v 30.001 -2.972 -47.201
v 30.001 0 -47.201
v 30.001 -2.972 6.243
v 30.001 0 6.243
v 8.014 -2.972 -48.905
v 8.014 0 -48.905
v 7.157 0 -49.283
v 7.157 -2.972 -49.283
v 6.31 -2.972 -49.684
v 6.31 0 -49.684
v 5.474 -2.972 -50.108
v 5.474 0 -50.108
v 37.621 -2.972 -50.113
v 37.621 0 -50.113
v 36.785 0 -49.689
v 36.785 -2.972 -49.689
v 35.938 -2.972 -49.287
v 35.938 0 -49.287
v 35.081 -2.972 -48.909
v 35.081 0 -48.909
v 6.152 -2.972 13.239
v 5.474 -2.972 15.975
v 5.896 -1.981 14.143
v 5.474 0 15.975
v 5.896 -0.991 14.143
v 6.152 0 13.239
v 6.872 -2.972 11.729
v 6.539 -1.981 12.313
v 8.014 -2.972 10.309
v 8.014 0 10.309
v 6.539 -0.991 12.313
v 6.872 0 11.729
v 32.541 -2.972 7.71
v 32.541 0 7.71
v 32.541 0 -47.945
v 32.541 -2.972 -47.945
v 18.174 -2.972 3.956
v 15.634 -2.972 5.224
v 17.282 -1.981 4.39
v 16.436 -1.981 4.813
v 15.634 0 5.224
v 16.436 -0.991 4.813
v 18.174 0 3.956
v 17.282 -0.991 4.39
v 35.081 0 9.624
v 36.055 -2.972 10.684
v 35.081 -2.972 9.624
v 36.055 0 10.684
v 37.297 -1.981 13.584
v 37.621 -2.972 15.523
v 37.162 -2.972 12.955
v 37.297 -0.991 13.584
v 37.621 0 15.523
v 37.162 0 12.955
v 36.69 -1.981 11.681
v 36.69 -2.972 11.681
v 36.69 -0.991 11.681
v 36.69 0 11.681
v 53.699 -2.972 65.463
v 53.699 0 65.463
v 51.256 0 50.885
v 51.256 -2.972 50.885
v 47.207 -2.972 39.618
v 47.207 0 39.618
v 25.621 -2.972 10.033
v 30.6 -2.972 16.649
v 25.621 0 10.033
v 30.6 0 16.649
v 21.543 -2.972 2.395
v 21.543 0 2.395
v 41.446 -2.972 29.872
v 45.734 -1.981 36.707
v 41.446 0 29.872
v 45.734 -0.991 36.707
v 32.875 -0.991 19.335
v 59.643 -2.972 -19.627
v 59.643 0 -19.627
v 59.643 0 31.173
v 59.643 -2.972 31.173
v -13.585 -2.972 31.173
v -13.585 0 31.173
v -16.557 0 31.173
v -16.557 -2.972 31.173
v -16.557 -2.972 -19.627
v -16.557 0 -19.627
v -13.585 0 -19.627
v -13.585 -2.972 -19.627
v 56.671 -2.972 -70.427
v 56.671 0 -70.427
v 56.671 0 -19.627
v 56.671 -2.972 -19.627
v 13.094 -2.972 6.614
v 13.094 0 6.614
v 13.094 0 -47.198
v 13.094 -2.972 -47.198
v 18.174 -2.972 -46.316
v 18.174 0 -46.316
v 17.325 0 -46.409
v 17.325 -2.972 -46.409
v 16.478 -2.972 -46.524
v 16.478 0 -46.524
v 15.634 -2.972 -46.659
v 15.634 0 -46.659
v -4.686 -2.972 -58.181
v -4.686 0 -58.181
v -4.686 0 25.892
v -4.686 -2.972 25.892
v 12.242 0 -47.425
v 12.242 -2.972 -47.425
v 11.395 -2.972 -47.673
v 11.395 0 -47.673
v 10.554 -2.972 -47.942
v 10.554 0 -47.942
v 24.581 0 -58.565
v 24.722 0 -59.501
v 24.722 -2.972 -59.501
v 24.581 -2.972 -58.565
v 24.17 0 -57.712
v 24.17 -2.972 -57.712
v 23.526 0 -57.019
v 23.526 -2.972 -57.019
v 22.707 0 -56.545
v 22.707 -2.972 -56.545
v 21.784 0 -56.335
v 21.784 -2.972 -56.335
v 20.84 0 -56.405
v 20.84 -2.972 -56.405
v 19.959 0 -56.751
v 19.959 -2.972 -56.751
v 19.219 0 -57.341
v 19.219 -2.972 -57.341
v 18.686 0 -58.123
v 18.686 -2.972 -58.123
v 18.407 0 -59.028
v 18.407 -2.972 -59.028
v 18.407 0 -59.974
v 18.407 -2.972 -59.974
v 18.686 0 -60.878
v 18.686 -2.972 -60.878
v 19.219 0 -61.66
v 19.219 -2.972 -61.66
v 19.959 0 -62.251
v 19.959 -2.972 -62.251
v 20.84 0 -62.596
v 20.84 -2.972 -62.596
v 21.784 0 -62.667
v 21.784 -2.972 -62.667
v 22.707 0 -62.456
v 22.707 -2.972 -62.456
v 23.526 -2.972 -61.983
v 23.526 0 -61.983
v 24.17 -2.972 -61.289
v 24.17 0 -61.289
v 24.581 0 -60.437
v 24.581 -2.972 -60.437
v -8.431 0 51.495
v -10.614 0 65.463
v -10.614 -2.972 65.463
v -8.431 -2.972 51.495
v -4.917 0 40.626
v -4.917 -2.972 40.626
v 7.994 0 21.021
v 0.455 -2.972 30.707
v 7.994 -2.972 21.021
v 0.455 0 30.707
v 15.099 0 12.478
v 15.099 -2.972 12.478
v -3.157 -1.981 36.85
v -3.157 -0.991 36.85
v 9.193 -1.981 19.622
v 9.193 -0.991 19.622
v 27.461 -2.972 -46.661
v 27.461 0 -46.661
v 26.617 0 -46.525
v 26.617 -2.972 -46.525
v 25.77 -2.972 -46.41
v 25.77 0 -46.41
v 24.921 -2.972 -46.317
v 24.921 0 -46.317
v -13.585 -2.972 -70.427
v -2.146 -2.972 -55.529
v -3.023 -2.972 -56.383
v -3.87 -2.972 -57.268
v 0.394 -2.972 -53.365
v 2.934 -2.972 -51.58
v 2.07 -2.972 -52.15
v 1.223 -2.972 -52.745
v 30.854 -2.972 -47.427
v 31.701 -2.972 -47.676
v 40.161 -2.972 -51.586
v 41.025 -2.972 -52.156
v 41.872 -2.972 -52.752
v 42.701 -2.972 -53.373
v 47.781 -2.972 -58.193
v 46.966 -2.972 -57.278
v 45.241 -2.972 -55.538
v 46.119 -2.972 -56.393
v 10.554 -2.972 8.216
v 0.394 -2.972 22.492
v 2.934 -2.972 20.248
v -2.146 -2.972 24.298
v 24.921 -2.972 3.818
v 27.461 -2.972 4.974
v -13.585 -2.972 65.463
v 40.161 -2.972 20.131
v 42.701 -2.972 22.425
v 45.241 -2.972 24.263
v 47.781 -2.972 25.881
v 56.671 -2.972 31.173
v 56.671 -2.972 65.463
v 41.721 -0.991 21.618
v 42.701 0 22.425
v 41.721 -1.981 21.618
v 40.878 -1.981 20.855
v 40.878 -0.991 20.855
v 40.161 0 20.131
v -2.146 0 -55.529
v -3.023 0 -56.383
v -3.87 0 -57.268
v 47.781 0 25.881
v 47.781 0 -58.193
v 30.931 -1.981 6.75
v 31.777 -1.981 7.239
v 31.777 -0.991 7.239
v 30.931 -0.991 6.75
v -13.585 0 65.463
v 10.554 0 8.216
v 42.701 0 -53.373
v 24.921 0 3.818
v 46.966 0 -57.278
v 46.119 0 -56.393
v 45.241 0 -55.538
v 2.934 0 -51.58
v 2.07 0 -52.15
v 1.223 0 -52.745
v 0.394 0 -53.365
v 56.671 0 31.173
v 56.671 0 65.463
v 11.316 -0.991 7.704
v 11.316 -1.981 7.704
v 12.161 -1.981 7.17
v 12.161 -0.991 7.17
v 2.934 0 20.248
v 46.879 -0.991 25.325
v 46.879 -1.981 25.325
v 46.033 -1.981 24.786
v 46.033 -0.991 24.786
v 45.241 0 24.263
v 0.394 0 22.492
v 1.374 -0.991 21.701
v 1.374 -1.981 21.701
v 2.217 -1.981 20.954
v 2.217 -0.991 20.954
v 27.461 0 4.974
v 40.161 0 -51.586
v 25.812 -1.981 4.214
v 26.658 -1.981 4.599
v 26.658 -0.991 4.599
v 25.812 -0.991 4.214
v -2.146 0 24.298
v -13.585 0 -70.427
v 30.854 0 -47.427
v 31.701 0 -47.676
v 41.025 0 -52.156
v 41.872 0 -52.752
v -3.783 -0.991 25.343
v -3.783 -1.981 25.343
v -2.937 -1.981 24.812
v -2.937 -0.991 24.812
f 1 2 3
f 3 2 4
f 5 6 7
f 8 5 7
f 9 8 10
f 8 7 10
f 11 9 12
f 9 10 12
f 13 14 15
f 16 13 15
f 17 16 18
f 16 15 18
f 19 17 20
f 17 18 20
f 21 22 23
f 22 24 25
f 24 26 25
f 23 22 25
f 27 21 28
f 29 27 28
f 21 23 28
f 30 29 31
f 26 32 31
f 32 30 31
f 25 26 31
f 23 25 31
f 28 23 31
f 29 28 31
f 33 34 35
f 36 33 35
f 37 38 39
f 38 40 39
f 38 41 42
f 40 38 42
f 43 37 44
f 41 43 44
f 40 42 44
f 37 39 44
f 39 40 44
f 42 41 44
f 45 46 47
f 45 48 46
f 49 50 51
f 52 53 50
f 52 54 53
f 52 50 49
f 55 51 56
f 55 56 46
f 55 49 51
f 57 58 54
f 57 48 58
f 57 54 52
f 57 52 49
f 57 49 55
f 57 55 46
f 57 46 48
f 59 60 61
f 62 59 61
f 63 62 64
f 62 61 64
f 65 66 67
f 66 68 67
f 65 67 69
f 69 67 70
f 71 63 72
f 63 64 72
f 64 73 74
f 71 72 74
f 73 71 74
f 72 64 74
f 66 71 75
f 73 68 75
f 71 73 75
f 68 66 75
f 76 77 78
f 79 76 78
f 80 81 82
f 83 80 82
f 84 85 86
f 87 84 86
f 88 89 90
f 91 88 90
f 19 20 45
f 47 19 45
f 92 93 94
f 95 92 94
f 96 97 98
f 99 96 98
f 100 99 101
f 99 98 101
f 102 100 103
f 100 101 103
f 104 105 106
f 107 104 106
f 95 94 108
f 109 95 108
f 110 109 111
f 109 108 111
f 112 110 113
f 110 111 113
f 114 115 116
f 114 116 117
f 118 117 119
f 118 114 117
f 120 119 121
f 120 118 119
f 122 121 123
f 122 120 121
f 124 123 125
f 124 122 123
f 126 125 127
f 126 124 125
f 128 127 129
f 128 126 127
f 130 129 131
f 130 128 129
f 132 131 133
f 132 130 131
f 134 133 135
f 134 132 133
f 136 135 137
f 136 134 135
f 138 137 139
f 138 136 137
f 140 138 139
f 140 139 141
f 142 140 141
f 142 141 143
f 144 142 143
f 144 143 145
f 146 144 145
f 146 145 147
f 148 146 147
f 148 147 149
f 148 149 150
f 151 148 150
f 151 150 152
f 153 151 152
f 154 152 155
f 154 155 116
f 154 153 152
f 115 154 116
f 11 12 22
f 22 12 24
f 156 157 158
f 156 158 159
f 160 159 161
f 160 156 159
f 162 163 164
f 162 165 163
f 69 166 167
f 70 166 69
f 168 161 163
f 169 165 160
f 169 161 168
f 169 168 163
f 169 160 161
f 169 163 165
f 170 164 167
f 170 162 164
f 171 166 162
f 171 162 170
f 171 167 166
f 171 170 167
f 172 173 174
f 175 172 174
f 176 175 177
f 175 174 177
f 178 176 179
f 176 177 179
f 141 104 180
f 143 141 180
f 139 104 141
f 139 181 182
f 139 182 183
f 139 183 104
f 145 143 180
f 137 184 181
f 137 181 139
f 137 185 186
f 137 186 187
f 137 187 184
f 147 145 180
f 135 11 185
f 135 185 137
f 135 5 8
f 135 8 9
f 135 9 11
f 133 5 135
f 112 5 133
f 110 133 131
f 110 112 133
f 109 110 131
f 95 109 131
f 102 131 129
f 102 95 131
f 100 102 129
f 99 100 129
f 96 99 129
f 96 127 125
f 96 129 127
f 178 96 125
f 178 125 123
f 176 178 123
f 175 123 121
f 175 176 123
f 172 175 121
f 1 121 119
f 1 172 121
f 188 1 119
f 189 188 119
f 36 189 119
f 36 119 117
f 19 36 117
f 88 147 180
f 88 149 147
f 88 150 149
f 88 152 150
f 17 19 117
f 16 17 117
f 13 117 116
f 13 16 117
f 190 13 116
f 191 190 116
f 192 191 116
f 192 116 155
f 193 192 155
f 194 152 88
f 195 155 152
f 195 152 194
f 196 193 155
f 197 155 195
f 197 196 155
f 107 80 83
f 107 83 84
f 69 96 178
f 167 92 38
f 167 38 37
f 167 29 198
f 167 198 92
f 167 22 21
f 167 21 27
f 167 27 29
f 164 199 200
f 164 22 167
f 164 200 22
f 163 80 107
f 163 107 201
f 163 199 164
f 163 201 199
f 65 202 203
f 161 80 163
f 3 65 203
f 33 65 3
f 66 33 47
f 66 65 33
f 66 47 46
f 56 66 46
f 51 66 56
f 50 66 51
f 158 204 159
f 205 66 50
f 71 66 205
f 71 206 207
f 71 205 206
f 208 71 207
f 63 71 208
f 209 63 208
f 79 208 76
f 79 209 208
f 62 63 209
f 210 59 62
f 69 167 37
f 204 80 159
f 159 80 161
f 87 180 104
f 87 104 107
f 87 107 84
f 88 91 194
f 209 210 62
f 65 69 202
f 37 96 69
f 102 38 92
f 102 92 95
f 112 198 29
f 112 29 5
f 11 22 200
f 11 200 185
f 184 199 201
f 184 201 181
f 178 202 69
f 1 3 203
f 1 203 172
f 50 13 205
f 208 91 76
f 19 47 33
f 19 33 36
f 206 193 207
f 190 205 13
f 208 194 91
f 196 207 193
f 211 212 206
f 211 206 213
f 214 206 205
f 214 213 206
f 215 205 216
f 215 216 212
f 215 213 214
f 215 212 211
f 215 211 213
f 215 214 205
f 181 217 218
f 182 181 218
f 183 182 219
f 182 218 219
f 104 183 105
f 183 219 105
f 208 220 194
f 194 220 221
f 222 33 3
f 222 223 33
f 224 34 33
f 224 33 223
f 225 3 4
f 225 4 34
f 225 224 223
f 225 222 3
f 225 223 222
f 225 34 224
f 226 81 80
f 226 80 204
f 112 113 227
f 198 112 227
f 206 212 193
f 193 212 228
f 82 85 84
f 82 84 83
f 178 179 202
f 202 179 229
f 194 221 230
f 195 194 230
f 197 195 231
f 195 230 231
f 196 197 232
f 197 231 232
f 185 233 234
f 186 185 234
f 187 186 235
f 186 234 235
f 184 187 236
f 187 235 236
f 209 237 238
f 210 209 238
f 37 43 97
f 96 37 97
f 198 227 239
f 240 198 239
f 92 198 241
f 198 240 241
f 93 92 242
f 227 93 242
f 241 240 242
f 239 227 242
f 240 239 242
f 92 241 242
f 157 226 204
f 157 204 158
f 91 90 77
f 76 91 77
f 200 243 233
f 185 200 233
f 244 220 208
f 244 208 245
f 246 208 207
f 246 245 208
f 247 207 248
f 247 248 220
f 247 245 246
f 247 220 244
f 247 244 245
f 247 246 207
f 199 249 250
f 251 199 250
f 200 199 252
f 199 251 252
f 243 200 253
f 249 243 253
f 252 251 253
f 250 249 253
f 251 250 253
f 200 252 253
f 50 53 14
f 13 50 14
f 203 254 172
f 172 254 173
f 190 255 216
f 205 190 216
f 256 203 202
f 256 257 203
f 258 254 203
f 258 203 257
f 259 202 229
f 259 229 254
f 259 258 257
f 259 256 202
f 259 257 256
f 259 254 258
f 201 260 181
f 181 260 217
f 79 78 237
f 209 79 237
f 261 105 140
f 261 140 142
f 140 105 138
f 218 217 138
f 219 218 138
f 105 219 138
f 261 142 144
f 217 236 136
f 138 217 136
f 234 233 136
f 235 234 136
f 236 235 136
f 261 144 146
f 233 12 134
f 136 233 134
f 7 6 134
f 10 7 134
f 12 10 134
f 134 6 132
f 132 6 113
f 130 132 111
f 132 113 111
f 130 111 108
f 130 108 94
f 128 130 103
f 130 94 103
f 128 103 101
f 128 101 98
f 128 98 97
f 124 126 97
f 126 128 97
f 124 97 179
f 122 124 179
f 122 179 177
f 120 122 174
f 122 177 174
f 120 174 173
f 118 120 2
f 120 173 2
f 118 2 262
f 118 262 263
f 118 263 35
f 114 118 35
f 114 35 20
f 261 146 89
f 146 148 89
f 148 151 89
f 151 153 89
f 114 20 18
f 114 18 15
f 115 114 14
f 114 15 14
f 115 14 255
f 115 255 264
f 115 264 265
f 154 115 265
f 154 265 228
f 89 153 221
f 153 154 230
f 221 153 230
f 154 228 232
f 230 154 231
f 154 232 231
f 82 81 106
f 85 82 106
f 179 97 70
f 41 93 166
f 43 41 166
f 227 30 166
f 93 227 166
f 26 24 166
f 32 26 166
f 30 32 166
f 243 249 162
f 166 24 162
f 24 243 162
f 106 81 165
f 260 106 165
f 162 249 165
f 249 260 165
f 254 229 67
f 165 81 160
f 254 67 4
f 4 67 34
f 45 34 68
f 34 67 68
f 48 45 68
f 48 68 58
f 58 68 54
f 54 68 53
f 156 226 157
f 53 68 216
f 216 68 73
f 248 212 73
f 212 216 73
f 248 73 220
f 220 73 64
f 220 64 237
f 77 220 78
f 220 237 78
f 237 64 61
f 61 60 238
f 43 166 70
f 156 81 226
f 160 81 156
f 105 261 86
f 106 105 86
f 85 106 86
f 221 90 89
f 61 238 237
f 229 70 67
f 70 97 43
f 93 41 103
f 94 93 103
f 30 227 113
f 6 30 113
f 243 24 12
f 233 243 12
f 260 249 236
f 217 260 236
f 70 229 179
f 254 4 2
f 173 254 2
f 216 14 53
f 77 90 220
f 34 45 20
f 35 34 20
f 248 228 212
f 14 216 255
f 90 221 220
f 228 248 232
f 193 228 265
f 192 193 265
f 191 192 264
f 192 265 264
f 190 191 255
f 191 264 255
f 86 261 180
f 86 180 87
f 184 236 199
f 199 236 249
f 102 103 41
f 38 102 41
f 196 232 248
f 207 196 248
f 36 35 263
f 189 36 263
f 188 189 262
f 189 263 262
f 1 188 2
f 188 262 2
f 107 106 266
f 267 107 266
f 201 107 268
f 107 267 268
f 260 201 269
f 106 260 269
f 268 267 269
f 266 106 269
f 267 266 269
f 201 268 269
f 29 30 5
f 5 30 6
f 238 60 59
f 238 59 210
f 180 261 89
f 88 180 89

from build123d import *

# Parameters (mm, degrees)
F0_R     = 3.175
F0_W     = 2.9718
F0_H     = 50.8
F0_H_2   = 34.29
F1_DEPTH = 2.9718


# Not quite as in the source:
# - a feature names something its author has since deleted; it is built from what else it names


with BuildPart() as f1:
    # F0 (on Front) → F1 (new body)
    with BuildSketch(Plane.XZ):
        with BuildLine():
            Line((-10.6135604082, -19.6269177035), (-10.6135604082, -70.4269177035))
            Line((-10.6135604082, -70.4269177035), (53.6992395918, -70.4269177035))
            Line((53.6992395918, -70.4269177035), (53.6992395918, -19.6269177035))
            Line((53.6992395918, -19.6269177035), (53.6992395918, 31.1730822965))
            Line((53.6992395918, 31.1730822965), (53.6992395918, 65.4630822965))
            add(Edge.make_bspline(
                [(53.6992395918, 65.4630822965), (50.3210395918, 27.3630822965), (29.9713909626, 22.7711647749), (21.5428395918, 2.3945980662)],
                knots=[0, 0, 0, 0, 70.7931335941, 70.7931335941, 70.7931335941, 70.7931335941], degree=3))
            add(Edge.make_bspline(
                [(-10.6135604082, 65.4630822965), (-7.2353604082, 27.3630822965), (10.8240395918, 23.417426143), (21.5428395918, 2.3945980662)],
                knots=[0, 0, 0, 0, 70.7931335941, 70.7931335941, 70.7931335941, 70.7931335941], degree=3))
            Line((-10.6135604082, 65.4630822965), (-10.6135604082, 31.1730822965))
            Line((-10.6135604082, 31.1730822965), (-10.6135604082, -19.6269177035))
        make_face()
        with Locations((21.5466730297, -59.5008693635)):
            Circle(F0_R, mode=Mode.SUBTRACT)
        with BuildLine():
            add(Edge.make_bspline(
                [(18.174427537, 3.9557799586), (19.2048586468, 3.4597391149), (20.3249139395, 2.9401290525), (21.5428395918, 2.3945980662)],
                knots=[36.4374086053, 36.4374086053, 36.4374086053, 36.4374086053, 38.1, 38.1, 38.1, 38.1], degree=3))
            add(Edge.make_bspline(
                [(24.9210395918, 3.8182866349), (23.8862684635, 3.3648017903), (22.7628335347, 2.8909334778), (21.5428395918, 2.3945980662)],
                knots=[36.4848270835, 36.4848270835, 36.4848270835, 36.4848270835, 38.1, 38.1, 38.1, 38.1], degree=3))
            add(Edge.make_bspline(
                [(27.4610395918, 4.9737252721), (26.6799254221, 4.6035259347), (25.8350725803, 4.2188584101), (24.9210395918, 3.8182866349)],
                knots=[35.0581141735, 35.0581141735, 35.0581141735, 35.0581141735, 36.4848270835, 36.4848270835, 36.4848270835, 36.4848270835], degree=3))
            add(Edge.make_bspline(
                [(30.0010395918, 6.2432045407), (29.2394523696, 5.8391275699), (28.3958951656, 5.4167884341), (27.4610395918, 4.9737252721)],
                knots=[33.3505910381, 33.3505910381, 33.3505910381, 33.3505910381, 35.0581141735, 35.0581141735, 35.0581141735, 35.0581141735], degree=3))
            add(Edge.make_bspline(
                [(32.5410395918, 7.709522157), (31.815508389, 7.2472020661), (30.9753523304, 6.7601477463), (30.0010395918, 6.2432045407)],
                knots=[31.1661248423, 31.1661248423, 31.1661248423, 31.1661248423, 33.3505910381, 33.3505910381, 33.3505910381, 33.3505910381], degree=3))
            add(Edge.make_bspline(
                [(35.0810395918, 9.6243844167), (34.4449246224, 9.0294716961), (33.6196497273, 8.3968297933), (32.5410395918, 7.709522157)],
                knots=[27.9185906625, 27.9185906625, 27.9185906625, 27.9185906625, 31.1661248423, 31.1661248423, 31.1661248423, 31.1661248423], degree=3))
            add(Edge.make_bspline(
                [(37.6210395918, 15.5231181366), (37.1997000639, 13.5029330493), (37.4295721889, 11.8207985618), (35.0810395918, 9.6243844167)],
                knots=[15.9287142288, 15.9287142288, 15.9287142288, 15.9287142288, 27.9185906625, 27.9185906625, 27.9185906625, 27.9185906625], degree=3))
            add(Edge.make_bspline(
                [(40.1610395918, 20.1314996321), (38.4452100282, 18.2956109855), (37.8952324766, 16.8377832468), (37.6210395918, 15.5231181366)],
                knots=[8.1261260785, 8.1261260785, 8.1261260785, 8.1261260785, 15.9287142288, 15.9287142288, 15.9287142288, 15.9287142288], degree=3))
            add(Edge.make_bspline(
                [(42.7010395918, 22.4248035121), (41.6492517803, 21.5958754464), (40.8193404202, 20.8358627241), (40.1610395918, 20.1314996321)],
                knots=[5.1325593794, 5.1325593794, 5.1325593794, 5.1325593794, 8.1261260785, 8.1261260785, 8.1261260785, 8.1261260785], degree=3))
            add(Edge.make_bspline(
                [(45.2410395918, 24.2632398541), (44.2752085711, 23.6139450004), (43.4342172947, 23.0026306826), (42.7010395918, 22.4248035121)],
                knots=[3.0458111478, 3.0458111478, 3.0458111478, 3.0458111478, 5.1325593794, 5.1325593794, 5.1325593794, 5.1325593794], degree=3))
            add(Edge.make_bspline(
                [(47.7810395918, 25.8807627574), (46.8503141861, 25.3162427283), (46.0064724881, 24.7778139666), (45.2410395918, 24.2632398541)],
                knots=[1.3920376526, 1.3920376526, 1.3920376526, 1.3920376526, 3.0458111478, 3.0458111478, 3.0458111478, 3.0458111478], degree=3))
            add(Edge.make_bspline(
                [(50.3210395918, 27.3630822965), (49.4094448692, 26.8496004392), (48.5644629644, 26.3559385528), (47.7810395918, 25.8807627574)],
                knots=[0, 0, 0, 0, 1.3920376526, 1.3920376526, 1.3920376526, 1.3920376526], degree=3))
            Line((50.3210395918, 27.3630822965), (50.3210395918, -61.5369177035))
            ThreePointArc((50.3210395918, -61.5369177035), (49.1018112077, -59.8262756393), (47.7810395918, -58.1927590453))
            ThreePointArc((47.7810395918, -58.1927590453), (46.5462872107, -56.8318592668), (45.2410395918, -55.5384180031))
            ThreePointArc((45.2410395918, -55.5384180031), (43.9971682474, -54.4248535099), (42.7010395918, -53.3725739321))
            ThreePointArc((42.7010395918, -53.3725739321), (41.4510857441, -52.4508932423), (40.1610395918, -51.5862194078))
            ThreePointArc((40.1610395918, -51.5862194078), (38.9066725875, -50.8226179021), (37.6210395918, -50.112919627))
            ThreePointArc((37.6210395918, -50.112919627), (36.36326544, -49.4852618571), (35.0810395918, -48.9092002568))
            ThreePointArc((35.0810395918, -48.9092002568), (33.8205009635, -48.4023559957), (32.5410395918, -47.9453796977))
            ThreePointArc((32.5410395918, -47.9453796977), (31.2781609586, -47.5487876175), (30.0010395918, -47.2007808145))
            ThreePointArc((30.0010395918, -47.2007808145), (28.7361037745, -46.907078004), (27.4610395918, -46.6610387941))
            ThreePointArc((27.4610395918, -46.6610387941), (26.1942303865, -46.4652554761), (24.9210395918, -46.316521248))
            ThreePointArc((24.9210395918, -46.316521248), (21.547756981, -46.1512435423), (18.174427537, -46.3155626059))
            ThreePointArc((18.174427537, -46.3155626059), (16.901243708, -46.46392835), (15.634427537, -46.659341362))
            ThreePointArc((15.634427537, -46.659341362), (14.3593708721, -46.90499798), (13.094427537, -47.1983152681))
            ThreePointArc((13.094427537, -47.1983152681), (11.8173145662, -47.5459173972), (10.554427537, -47.9421006017))
            ThreePointArc((10.554427537, -47.9421006017), (9.2749758876, -48.3986398999), (8.014427537, -48.9050414301))
            ThreePointArc((8.014427537, -48.9050414301), (6.7322134008, -49.480619628), (5.474427537, -50.1077863311))
            ThreePointArc((5.474427537, -50.1077863311), (4.1888093009, -50.8169340928), (2.934427537, -51.5799748434))
            ThreePointArc((2.934427537, -51.5799748434), (1.6444010223, -52.4439982142), (0.394427537, -53.365014544))
            ThreePointArc((0.394427537, -53.365014544), (-0.9016730983, -54.4164866486), (-2.145572463, -55.5292241802))
            ThreePointArc((-2.145572463, -55.5292241802), (-3.4507759715, -56.8215888342), (-4.685572463, -58.1813830179))
            ThreePointArc((-4.685572463, -58.1813830179), (-6.0115928229, -59.8203006816), (-7.2353604082, -61.5369177035))
            add(Edge.make_bspline(
                [(-7.2353604082, 27.3630822965), (-7.2353604082, -0.334873893), (-7.2353604082, -33.838961514), (-7.2353604082, -61.5369177035)],
                knots=[0, 0, 0, 0, 88.9, 88.9, 88.9, 88.9], degree=3))
            add(Edge.make_bspline(
                [(-7.2353604082, 27.3630822965), (-6.3195404997, 26.8524970598), (-5.4713701457, 26.3626827218), (-4.685572463, 25.8921343821)],
                knots=[0, 0, 0, 0, 1.4327172124, 1.4327172124, 1.4327172124, 1.4327172124], degree=3))
            add(Edge.make_bspline(
                [(-4.685572463, 25.8921343821), (-3.7542137819, 25.3344217663), (-2.9104758153, 24.8037738972), (-2.145572463, 24.29768509)],
                knots=[1.4327172124, 1.4327172124, 1.4327172124, 1.4327172124, 3.1308306617, 3.1308306617, 3.1308306617, 3.1308306617], degree=3))
            add(Edge.make_bspline(
                [(-2.145572463, 24.29768509), (-1.1789086721, 23.6581039933), (-0.3381532858, 23.057746686), (0.394427537, 22.491555701)],
                knots=[3.1308306617, 3.1308306617, 3.1308306617, 3.1308306617, 5.2768596724, 5.2768596724, 5.2768596724, 5.2768596724], degree=3))
            add(Edge.make_bspline(
                [(0.394427537, 22.491555701), (1.4468013348, 21.6782057761), (2.2759443341, 20.9353620327), (2.934427537, 20.2480318861)],
                knots=[5.2768596724, 5.2768596724, 5.2768596724, 5.2768596724, 8.3596931702, 8.3596931702, 8.3596931702, 8.3596931702], degree=3))
            add(Edge.make_bspline(
                [(2.934427537, 20.2480318861), (4.5480124747, 18.5637587463), (5.1368295827, 17.2128303622), (5.474427537, 15.9746404386)],
                knots=[8.3596931702, 8.3596931702, 8.3596931702, 8.3596931702, 15.9140448616, 15.9140448616, 15.9140448616, 15.9140448616], degree=3))
            add(Edge.make_bspline(
                [(5.474427537, 15.9746404386), (5.9896552573, 14.084967342), (5.9197540389, 12.4578798594), (8.014427537, 10.3091972977)],
                knots=[15.9140448616, 15.9140448616, 15.9140448616, 15.9140448616, 27.4431769284, 27.4431769284, 27.4431769284, 27.4431769284], degree=3))
            add(Edge.make_bspline(
                [(8.014427537, 10.3091972977), (8.6420846531, 9.6653566698), (9.4640918921, 8.9746837165), (10.554427537, 8.2160807673)],
                knots=[27.4431769284, 27.4431769284, 27.4431769284, 27.4431769284, 30.8978164182, 30.8978164182, 30.8978164182, 30.8978164182], degree=3))
            add(Edge.make_bspline(
                [(10.554427537, 8.2160807673), (11.2763160606, 7.713825553), (12.1158260279, 7.1817933043), (13.094427537, 6.6138610208)],
                knots=[30.8978164182, 30.8978164182, 30.8978164182, 30.8978164182, 33.1850612795, 33.1850612795, 33.1850612795, 33.1850612795], degree=3))
            add(Edge.make_bspline(
                [(13.094427537, 6.6138610208), (13.8539601424, 6.1730655764), (14.6972807439, 5.7106441444), (15.634427537, 5.2237339583)],
                knots=[33.1850612795, 33.1850612795, 33.1850612795, 33.1850612795, 34.9602854465, 34.9602854465, 34.9602854465, 34.9602854465], degree=3))
            add(Edge.make_bspline(
                [(15.634427537, 5.2237339583), (16.4142058077, 4.8185872026), (17.2589448389, 4.3964856066), (18.174427537, 3.9557799586)],
                knots=[34.9602854465, 34.9602854465, 34.9602854465, 34.9602854465, 36.4374086053, 36.4374086053, 36.4374086053, 36.4374086053], degree=3))
        make_face(mode=Mode.SUBTRACT)
        with BuildLine():
            add(Edge.make_bspline(
                [(24.9210395918, 3.8182866349), (23.8862684635, 3.3648017903), (22.7628335347, 2.8909334778), (21.5428395918, 2.3945980662)],
                knots=[36.4848270835, 36.4848270835, 36.4848270835, 36.4848270835, 38.1, 38.1, 38.1, 38.1], degree=3))
            add(Edge.make_bspline(
                [(18.174427537, 3.9557799586), (19.2048586468, 3.4597391149), (20.3249139395, 2.9401290525), (21.5428395918, 2.3945980662)],
                knots=[36.4374086053, 36.4374086053, 36.4374086053, 36.4374086053, 38.1, 38.1, 38.1, 38.1], degree=3))
            Line((18.174427537, 3.9557799586), (18.174427537, -46.3155626059))
            ThreePointArc((18.174427537, -46.3155626059), (21.547756981, -46.1512435423), (24.9210395918, -46.316521248))
            Line((24.9210395918, -46.316521248), (24.9210395918, 3.8182866349))
        make_face()
        with BuildLine():
            Line((-4.685572463, -58.1813830179), (-4.685572463, 25.8921343821))
            add(Edge.make_bspline(
                [(-7.2353604082, 27.3630822965), (-6.3195404997, 26.8524970598), (-5.4713701457, 26.3626827218), (-4.685572463, 25.8921343821)],
                knots=[0, 0, 0, 0, 1.4327172124, 1.4327172124, 1.4327172124, 1.4327172124], degree=3))
            add(Edge.make_bspline(
                [(-7.2353604082, 27.3630822965), (-7.2353604082, -0.334873893), (-7.2353604082, -33.838961514), (-7.2353604082, -61.5369177035)],
                knots=[0, 0, 0, 0, 88.9, 88.9, 88.9, 88.9], degree=3))
            ThreePointArc((-7.2353604082, -61.5369177035), (-6.0115928229, -59.8203006816), (-4.685572463, -58.1813830179))
        make_face()
        with BuildLine():
            add(Edge.make_bspline(
                [(50.3210395918, 27.3630822965), (49.4094448692, 26.8496004392), (48.5644629644, 26.3559385528), (47.7810395918, 25.8807627574)],
                knots=[0, 0, 0, 0, 1.3920376526, 1.3920376526, 1.3920376526, 1.3920376526], degree=3))
            Line((47.7810395918, 25.8807627574), (47.7810395918, -58.1927590453))
            ThreePointArc((47.7810395918, -58.1927590453), (49.1018112077, -59.8262756393), (50.3210395918, -61.5369177035))
            Line((50.3210395918, -61.5369177035), (50.3210395918, 27.3630822965))
        make_face()
        with BuildLine():
            Line((0.394427537, -53.365014544), (0.394427537, 22.491555701))
            add(Edge.make_bspline(
                [(-2.145572463, 24.29768509), (-1.1789086721, 23.6581039933), (-0.3381532858, 23.057746686), (0.394427537, 22.491555701)],
                knots=[3.1308306617, 3.1308306617, 3.1308306617, 3.1308306617, 5.2768596724, 5.2768596724, 5.2768596724, 5.2768596724], degree=3))
            Line((-2.145572463, 24.29768509), (-2.145572463, -55.5292241802))
            ThreePointArc((-2.145572463, -55.5292241802), (-0.9016730983, -54.4164866486), (0.394427537, -53.365014544))
        make_face()
        with BuildLine():
            add(Edge.make_bspline(
                [(45.2410395918, 24.2632398541), (44.2752085711, 23.6139450004), (43.4342172947, 23.0026306826), (42.7010395918, 22.4248035121)],
                knots=[3.0458111478, 3.0458111478, 3.0458111478, 3.0458111478, 5.1325593794, 5.1325593794, 5.1325593794, 5.1325593794], degree=3))
            Line((42.7010395918, 22.4248035121), (42.7010395918, -53.3725739321))
            ThreePointArc((42.7010395918, -53.3725739321), (43.9971682474, -54.4248535099), (45.2410395918, -55.5384180031))
            Line((45.2410395918, -55.5384180031), (45.2410395918, 24.2632398541))
        make_face()
        with BuildLine():
            Line((5.474427537, -50.1077863311), (5.474427537, 15.9746404386))
            add(Edge.make_bspline(
                [(2.934427537, 20.2480318861), (4.5480124747, 18.5637587463), (5.1368295827, 17.2128303622), (5.474427537, 15.9746404386)],
                knots=[8.3596931702, 8.3596931702, 8.3596931702, 8.3596931702, 15.9140448616, 15.9140448616, 15.9140448616, 15.9140448616], degree=3))
            Line((2.934427537, 20.2480318861), (2.934427537, -51.5799748434))
            ThreePointArc((2.934427537, -51.5799748434), (4.1888093009, -50.8169340928), (5.474427537, -50.1077863311))
        make_face()
        with BuildLine():
            add(Edge.make_bspline(
                [(40.1610395918, 20.1314996321), (38.4452100282, 18.2956109855), (37.8952324766, 16.8377832468), (37.6210395918, 15.5231181366)],
                knots=[8.1261260785, 8.1261260785, 8.1261260785, 8.1261260785, 15.9287142288, 15.9287142288, 15.9287142288, 15.9287142288], degree=3))
            Line((37.6210395918, 15.5231181366), (37.6210395918, -50.112919627))
            ThreePointArc((37.6210395918, -50.112919627), (38.9066725875, -50.8226179021), (40.1610395918, -51.5862194078))
            Line((40.1610395918, -51.5862194078), (40.1610395918, 20.1314996321))
        make_face()
        with Locations((55.1851395918, 5.7730822965)):
            Rectangle(F0_W, F0_H)
        with Locations((-12.0994604082, 5.7730822965)):
            Rectangle(F0_W, F0_H)
        with Locations((-15.0712604082, 5.7730822965)):
            Rectangle(F0_W, F0_H)
        with Locations((-12.0994604082, -45.0269177035)):
            Rectangle(F0_W, F0_H)
        with Locations((55.1851395918, -45.0269177035)):
            Rectangle(F0_W, F0_H)
        with Locations((58.1569395918, 5.7730822965)):
            Rectangle(F0_W, F0_H)
        with BuildLine():
            Line((10.554427537, -47.9421006017), (10.554427537, 8.2160807673))
            add(Edge.make_bspline(
                [(8.014427537, 10.3091972977), (8.6420846531, 9.6653566698), (9.4640918921, 8.9746837165), (10.554427537, 8.2160807673)],
                knots=[27.4431769284, 27.4431769284, 27.4431769284, 27.4431769284, 30.8978164182, 30.8978164182, 30.8978164182, 30.8978164182], degree=3))
            Line((8.014427537, 10.3091972977), (8.014427537, -48.9050414301))
            ThreePointArc((8.014427537, -48.9050414301), (9.2749758876, -48.3986398999), (10.554427537, -47.9421006017))
        make_face()
        with BuildLine():
            add(Edge.make_bspline(
                [(35.0810395918, 9.6243844167), (34.4449246224, 9.0294716961), (33.6196497273, 8.3968297933), (32.5410395918, 7.709522157)],
                knots=[27.9185906625, 27.9185906625, 27.9185906625, 27.9185906625, 31.1661248423, 31.1661248423, 31.1661248423, 31.1661248423], degree=3))
            Line((32.5410395918, 7.709522157), (32.5410395918, -47.9453796977))
            ThreePointArc((32.5410395918, -47.9453796977), (33.8205009635, -48.4023559957), (35.0810395918, -48.9092002568))
            Line((35.0810395918, -48.9092002568), (35.0810395918, 9.6243844167))
        make_face()
        with BuildLine():
            Line((15.634427537, -46.659341362), (15.634427537, 5.2237339583))
            add(Edge.make_bspline(
                [(13.094427537, 6.6138610208), (13.8539601424, 6.1730655764), (14.6972807439, 5.7106441444), (15.634427537, 5.2237339583)],
                knots=[33.1850612795, 33.1850612795, 33.1850612795, 33.1850612795, 34.9602854465, 34.9602854465, 34.9602854465, 34.9602854465], degree=3))
            Line((13.094427537, 6.6138610208), (13.094427537, -47.1983152681))
            ThreePointArc((13.094427537, -47.1983152681), (14.3593708721, -46.90499798), (15.634427537, -46.659341362))
        make_face()
        with BuildLine():
            add(Edge.make_bspline(
                [(30.0010395918, 6.2432045407), (29.2394523696, 5.8391275699), (28.3958951656, 5.4167884341), (27.4610395918, 4.9737252721)],
                knots=[33.3505910381, 33.3505910381, 33.3505910381, 33.3505910381, 35.0581141735, 35.0581141735, 35.0581141735, 35.0581141735], degree=3))
            Line((27.4610395918, 4.9737252721), (27.4610395918, -46.6610387941))
            ThreePointArc((27.4610395918, -46.6610387941), (28.7361037745, -46.907078004), (30.0010395918, -47.2007808145))
            Line((30.0010395918, -47.2007808145), (30.0010395918, 6.2432045407))
        make_face()
        with Locations((-12.0994604082, 48.3180822965)):
            Rectangle(F0_W, F0_H_2)
        with Locations((55.1851395918, 48.3180822965)):
            Rectangle(F0_W, F0_H_2)
    extrude(amount=F1_DEPTH)


solid = f1.part
